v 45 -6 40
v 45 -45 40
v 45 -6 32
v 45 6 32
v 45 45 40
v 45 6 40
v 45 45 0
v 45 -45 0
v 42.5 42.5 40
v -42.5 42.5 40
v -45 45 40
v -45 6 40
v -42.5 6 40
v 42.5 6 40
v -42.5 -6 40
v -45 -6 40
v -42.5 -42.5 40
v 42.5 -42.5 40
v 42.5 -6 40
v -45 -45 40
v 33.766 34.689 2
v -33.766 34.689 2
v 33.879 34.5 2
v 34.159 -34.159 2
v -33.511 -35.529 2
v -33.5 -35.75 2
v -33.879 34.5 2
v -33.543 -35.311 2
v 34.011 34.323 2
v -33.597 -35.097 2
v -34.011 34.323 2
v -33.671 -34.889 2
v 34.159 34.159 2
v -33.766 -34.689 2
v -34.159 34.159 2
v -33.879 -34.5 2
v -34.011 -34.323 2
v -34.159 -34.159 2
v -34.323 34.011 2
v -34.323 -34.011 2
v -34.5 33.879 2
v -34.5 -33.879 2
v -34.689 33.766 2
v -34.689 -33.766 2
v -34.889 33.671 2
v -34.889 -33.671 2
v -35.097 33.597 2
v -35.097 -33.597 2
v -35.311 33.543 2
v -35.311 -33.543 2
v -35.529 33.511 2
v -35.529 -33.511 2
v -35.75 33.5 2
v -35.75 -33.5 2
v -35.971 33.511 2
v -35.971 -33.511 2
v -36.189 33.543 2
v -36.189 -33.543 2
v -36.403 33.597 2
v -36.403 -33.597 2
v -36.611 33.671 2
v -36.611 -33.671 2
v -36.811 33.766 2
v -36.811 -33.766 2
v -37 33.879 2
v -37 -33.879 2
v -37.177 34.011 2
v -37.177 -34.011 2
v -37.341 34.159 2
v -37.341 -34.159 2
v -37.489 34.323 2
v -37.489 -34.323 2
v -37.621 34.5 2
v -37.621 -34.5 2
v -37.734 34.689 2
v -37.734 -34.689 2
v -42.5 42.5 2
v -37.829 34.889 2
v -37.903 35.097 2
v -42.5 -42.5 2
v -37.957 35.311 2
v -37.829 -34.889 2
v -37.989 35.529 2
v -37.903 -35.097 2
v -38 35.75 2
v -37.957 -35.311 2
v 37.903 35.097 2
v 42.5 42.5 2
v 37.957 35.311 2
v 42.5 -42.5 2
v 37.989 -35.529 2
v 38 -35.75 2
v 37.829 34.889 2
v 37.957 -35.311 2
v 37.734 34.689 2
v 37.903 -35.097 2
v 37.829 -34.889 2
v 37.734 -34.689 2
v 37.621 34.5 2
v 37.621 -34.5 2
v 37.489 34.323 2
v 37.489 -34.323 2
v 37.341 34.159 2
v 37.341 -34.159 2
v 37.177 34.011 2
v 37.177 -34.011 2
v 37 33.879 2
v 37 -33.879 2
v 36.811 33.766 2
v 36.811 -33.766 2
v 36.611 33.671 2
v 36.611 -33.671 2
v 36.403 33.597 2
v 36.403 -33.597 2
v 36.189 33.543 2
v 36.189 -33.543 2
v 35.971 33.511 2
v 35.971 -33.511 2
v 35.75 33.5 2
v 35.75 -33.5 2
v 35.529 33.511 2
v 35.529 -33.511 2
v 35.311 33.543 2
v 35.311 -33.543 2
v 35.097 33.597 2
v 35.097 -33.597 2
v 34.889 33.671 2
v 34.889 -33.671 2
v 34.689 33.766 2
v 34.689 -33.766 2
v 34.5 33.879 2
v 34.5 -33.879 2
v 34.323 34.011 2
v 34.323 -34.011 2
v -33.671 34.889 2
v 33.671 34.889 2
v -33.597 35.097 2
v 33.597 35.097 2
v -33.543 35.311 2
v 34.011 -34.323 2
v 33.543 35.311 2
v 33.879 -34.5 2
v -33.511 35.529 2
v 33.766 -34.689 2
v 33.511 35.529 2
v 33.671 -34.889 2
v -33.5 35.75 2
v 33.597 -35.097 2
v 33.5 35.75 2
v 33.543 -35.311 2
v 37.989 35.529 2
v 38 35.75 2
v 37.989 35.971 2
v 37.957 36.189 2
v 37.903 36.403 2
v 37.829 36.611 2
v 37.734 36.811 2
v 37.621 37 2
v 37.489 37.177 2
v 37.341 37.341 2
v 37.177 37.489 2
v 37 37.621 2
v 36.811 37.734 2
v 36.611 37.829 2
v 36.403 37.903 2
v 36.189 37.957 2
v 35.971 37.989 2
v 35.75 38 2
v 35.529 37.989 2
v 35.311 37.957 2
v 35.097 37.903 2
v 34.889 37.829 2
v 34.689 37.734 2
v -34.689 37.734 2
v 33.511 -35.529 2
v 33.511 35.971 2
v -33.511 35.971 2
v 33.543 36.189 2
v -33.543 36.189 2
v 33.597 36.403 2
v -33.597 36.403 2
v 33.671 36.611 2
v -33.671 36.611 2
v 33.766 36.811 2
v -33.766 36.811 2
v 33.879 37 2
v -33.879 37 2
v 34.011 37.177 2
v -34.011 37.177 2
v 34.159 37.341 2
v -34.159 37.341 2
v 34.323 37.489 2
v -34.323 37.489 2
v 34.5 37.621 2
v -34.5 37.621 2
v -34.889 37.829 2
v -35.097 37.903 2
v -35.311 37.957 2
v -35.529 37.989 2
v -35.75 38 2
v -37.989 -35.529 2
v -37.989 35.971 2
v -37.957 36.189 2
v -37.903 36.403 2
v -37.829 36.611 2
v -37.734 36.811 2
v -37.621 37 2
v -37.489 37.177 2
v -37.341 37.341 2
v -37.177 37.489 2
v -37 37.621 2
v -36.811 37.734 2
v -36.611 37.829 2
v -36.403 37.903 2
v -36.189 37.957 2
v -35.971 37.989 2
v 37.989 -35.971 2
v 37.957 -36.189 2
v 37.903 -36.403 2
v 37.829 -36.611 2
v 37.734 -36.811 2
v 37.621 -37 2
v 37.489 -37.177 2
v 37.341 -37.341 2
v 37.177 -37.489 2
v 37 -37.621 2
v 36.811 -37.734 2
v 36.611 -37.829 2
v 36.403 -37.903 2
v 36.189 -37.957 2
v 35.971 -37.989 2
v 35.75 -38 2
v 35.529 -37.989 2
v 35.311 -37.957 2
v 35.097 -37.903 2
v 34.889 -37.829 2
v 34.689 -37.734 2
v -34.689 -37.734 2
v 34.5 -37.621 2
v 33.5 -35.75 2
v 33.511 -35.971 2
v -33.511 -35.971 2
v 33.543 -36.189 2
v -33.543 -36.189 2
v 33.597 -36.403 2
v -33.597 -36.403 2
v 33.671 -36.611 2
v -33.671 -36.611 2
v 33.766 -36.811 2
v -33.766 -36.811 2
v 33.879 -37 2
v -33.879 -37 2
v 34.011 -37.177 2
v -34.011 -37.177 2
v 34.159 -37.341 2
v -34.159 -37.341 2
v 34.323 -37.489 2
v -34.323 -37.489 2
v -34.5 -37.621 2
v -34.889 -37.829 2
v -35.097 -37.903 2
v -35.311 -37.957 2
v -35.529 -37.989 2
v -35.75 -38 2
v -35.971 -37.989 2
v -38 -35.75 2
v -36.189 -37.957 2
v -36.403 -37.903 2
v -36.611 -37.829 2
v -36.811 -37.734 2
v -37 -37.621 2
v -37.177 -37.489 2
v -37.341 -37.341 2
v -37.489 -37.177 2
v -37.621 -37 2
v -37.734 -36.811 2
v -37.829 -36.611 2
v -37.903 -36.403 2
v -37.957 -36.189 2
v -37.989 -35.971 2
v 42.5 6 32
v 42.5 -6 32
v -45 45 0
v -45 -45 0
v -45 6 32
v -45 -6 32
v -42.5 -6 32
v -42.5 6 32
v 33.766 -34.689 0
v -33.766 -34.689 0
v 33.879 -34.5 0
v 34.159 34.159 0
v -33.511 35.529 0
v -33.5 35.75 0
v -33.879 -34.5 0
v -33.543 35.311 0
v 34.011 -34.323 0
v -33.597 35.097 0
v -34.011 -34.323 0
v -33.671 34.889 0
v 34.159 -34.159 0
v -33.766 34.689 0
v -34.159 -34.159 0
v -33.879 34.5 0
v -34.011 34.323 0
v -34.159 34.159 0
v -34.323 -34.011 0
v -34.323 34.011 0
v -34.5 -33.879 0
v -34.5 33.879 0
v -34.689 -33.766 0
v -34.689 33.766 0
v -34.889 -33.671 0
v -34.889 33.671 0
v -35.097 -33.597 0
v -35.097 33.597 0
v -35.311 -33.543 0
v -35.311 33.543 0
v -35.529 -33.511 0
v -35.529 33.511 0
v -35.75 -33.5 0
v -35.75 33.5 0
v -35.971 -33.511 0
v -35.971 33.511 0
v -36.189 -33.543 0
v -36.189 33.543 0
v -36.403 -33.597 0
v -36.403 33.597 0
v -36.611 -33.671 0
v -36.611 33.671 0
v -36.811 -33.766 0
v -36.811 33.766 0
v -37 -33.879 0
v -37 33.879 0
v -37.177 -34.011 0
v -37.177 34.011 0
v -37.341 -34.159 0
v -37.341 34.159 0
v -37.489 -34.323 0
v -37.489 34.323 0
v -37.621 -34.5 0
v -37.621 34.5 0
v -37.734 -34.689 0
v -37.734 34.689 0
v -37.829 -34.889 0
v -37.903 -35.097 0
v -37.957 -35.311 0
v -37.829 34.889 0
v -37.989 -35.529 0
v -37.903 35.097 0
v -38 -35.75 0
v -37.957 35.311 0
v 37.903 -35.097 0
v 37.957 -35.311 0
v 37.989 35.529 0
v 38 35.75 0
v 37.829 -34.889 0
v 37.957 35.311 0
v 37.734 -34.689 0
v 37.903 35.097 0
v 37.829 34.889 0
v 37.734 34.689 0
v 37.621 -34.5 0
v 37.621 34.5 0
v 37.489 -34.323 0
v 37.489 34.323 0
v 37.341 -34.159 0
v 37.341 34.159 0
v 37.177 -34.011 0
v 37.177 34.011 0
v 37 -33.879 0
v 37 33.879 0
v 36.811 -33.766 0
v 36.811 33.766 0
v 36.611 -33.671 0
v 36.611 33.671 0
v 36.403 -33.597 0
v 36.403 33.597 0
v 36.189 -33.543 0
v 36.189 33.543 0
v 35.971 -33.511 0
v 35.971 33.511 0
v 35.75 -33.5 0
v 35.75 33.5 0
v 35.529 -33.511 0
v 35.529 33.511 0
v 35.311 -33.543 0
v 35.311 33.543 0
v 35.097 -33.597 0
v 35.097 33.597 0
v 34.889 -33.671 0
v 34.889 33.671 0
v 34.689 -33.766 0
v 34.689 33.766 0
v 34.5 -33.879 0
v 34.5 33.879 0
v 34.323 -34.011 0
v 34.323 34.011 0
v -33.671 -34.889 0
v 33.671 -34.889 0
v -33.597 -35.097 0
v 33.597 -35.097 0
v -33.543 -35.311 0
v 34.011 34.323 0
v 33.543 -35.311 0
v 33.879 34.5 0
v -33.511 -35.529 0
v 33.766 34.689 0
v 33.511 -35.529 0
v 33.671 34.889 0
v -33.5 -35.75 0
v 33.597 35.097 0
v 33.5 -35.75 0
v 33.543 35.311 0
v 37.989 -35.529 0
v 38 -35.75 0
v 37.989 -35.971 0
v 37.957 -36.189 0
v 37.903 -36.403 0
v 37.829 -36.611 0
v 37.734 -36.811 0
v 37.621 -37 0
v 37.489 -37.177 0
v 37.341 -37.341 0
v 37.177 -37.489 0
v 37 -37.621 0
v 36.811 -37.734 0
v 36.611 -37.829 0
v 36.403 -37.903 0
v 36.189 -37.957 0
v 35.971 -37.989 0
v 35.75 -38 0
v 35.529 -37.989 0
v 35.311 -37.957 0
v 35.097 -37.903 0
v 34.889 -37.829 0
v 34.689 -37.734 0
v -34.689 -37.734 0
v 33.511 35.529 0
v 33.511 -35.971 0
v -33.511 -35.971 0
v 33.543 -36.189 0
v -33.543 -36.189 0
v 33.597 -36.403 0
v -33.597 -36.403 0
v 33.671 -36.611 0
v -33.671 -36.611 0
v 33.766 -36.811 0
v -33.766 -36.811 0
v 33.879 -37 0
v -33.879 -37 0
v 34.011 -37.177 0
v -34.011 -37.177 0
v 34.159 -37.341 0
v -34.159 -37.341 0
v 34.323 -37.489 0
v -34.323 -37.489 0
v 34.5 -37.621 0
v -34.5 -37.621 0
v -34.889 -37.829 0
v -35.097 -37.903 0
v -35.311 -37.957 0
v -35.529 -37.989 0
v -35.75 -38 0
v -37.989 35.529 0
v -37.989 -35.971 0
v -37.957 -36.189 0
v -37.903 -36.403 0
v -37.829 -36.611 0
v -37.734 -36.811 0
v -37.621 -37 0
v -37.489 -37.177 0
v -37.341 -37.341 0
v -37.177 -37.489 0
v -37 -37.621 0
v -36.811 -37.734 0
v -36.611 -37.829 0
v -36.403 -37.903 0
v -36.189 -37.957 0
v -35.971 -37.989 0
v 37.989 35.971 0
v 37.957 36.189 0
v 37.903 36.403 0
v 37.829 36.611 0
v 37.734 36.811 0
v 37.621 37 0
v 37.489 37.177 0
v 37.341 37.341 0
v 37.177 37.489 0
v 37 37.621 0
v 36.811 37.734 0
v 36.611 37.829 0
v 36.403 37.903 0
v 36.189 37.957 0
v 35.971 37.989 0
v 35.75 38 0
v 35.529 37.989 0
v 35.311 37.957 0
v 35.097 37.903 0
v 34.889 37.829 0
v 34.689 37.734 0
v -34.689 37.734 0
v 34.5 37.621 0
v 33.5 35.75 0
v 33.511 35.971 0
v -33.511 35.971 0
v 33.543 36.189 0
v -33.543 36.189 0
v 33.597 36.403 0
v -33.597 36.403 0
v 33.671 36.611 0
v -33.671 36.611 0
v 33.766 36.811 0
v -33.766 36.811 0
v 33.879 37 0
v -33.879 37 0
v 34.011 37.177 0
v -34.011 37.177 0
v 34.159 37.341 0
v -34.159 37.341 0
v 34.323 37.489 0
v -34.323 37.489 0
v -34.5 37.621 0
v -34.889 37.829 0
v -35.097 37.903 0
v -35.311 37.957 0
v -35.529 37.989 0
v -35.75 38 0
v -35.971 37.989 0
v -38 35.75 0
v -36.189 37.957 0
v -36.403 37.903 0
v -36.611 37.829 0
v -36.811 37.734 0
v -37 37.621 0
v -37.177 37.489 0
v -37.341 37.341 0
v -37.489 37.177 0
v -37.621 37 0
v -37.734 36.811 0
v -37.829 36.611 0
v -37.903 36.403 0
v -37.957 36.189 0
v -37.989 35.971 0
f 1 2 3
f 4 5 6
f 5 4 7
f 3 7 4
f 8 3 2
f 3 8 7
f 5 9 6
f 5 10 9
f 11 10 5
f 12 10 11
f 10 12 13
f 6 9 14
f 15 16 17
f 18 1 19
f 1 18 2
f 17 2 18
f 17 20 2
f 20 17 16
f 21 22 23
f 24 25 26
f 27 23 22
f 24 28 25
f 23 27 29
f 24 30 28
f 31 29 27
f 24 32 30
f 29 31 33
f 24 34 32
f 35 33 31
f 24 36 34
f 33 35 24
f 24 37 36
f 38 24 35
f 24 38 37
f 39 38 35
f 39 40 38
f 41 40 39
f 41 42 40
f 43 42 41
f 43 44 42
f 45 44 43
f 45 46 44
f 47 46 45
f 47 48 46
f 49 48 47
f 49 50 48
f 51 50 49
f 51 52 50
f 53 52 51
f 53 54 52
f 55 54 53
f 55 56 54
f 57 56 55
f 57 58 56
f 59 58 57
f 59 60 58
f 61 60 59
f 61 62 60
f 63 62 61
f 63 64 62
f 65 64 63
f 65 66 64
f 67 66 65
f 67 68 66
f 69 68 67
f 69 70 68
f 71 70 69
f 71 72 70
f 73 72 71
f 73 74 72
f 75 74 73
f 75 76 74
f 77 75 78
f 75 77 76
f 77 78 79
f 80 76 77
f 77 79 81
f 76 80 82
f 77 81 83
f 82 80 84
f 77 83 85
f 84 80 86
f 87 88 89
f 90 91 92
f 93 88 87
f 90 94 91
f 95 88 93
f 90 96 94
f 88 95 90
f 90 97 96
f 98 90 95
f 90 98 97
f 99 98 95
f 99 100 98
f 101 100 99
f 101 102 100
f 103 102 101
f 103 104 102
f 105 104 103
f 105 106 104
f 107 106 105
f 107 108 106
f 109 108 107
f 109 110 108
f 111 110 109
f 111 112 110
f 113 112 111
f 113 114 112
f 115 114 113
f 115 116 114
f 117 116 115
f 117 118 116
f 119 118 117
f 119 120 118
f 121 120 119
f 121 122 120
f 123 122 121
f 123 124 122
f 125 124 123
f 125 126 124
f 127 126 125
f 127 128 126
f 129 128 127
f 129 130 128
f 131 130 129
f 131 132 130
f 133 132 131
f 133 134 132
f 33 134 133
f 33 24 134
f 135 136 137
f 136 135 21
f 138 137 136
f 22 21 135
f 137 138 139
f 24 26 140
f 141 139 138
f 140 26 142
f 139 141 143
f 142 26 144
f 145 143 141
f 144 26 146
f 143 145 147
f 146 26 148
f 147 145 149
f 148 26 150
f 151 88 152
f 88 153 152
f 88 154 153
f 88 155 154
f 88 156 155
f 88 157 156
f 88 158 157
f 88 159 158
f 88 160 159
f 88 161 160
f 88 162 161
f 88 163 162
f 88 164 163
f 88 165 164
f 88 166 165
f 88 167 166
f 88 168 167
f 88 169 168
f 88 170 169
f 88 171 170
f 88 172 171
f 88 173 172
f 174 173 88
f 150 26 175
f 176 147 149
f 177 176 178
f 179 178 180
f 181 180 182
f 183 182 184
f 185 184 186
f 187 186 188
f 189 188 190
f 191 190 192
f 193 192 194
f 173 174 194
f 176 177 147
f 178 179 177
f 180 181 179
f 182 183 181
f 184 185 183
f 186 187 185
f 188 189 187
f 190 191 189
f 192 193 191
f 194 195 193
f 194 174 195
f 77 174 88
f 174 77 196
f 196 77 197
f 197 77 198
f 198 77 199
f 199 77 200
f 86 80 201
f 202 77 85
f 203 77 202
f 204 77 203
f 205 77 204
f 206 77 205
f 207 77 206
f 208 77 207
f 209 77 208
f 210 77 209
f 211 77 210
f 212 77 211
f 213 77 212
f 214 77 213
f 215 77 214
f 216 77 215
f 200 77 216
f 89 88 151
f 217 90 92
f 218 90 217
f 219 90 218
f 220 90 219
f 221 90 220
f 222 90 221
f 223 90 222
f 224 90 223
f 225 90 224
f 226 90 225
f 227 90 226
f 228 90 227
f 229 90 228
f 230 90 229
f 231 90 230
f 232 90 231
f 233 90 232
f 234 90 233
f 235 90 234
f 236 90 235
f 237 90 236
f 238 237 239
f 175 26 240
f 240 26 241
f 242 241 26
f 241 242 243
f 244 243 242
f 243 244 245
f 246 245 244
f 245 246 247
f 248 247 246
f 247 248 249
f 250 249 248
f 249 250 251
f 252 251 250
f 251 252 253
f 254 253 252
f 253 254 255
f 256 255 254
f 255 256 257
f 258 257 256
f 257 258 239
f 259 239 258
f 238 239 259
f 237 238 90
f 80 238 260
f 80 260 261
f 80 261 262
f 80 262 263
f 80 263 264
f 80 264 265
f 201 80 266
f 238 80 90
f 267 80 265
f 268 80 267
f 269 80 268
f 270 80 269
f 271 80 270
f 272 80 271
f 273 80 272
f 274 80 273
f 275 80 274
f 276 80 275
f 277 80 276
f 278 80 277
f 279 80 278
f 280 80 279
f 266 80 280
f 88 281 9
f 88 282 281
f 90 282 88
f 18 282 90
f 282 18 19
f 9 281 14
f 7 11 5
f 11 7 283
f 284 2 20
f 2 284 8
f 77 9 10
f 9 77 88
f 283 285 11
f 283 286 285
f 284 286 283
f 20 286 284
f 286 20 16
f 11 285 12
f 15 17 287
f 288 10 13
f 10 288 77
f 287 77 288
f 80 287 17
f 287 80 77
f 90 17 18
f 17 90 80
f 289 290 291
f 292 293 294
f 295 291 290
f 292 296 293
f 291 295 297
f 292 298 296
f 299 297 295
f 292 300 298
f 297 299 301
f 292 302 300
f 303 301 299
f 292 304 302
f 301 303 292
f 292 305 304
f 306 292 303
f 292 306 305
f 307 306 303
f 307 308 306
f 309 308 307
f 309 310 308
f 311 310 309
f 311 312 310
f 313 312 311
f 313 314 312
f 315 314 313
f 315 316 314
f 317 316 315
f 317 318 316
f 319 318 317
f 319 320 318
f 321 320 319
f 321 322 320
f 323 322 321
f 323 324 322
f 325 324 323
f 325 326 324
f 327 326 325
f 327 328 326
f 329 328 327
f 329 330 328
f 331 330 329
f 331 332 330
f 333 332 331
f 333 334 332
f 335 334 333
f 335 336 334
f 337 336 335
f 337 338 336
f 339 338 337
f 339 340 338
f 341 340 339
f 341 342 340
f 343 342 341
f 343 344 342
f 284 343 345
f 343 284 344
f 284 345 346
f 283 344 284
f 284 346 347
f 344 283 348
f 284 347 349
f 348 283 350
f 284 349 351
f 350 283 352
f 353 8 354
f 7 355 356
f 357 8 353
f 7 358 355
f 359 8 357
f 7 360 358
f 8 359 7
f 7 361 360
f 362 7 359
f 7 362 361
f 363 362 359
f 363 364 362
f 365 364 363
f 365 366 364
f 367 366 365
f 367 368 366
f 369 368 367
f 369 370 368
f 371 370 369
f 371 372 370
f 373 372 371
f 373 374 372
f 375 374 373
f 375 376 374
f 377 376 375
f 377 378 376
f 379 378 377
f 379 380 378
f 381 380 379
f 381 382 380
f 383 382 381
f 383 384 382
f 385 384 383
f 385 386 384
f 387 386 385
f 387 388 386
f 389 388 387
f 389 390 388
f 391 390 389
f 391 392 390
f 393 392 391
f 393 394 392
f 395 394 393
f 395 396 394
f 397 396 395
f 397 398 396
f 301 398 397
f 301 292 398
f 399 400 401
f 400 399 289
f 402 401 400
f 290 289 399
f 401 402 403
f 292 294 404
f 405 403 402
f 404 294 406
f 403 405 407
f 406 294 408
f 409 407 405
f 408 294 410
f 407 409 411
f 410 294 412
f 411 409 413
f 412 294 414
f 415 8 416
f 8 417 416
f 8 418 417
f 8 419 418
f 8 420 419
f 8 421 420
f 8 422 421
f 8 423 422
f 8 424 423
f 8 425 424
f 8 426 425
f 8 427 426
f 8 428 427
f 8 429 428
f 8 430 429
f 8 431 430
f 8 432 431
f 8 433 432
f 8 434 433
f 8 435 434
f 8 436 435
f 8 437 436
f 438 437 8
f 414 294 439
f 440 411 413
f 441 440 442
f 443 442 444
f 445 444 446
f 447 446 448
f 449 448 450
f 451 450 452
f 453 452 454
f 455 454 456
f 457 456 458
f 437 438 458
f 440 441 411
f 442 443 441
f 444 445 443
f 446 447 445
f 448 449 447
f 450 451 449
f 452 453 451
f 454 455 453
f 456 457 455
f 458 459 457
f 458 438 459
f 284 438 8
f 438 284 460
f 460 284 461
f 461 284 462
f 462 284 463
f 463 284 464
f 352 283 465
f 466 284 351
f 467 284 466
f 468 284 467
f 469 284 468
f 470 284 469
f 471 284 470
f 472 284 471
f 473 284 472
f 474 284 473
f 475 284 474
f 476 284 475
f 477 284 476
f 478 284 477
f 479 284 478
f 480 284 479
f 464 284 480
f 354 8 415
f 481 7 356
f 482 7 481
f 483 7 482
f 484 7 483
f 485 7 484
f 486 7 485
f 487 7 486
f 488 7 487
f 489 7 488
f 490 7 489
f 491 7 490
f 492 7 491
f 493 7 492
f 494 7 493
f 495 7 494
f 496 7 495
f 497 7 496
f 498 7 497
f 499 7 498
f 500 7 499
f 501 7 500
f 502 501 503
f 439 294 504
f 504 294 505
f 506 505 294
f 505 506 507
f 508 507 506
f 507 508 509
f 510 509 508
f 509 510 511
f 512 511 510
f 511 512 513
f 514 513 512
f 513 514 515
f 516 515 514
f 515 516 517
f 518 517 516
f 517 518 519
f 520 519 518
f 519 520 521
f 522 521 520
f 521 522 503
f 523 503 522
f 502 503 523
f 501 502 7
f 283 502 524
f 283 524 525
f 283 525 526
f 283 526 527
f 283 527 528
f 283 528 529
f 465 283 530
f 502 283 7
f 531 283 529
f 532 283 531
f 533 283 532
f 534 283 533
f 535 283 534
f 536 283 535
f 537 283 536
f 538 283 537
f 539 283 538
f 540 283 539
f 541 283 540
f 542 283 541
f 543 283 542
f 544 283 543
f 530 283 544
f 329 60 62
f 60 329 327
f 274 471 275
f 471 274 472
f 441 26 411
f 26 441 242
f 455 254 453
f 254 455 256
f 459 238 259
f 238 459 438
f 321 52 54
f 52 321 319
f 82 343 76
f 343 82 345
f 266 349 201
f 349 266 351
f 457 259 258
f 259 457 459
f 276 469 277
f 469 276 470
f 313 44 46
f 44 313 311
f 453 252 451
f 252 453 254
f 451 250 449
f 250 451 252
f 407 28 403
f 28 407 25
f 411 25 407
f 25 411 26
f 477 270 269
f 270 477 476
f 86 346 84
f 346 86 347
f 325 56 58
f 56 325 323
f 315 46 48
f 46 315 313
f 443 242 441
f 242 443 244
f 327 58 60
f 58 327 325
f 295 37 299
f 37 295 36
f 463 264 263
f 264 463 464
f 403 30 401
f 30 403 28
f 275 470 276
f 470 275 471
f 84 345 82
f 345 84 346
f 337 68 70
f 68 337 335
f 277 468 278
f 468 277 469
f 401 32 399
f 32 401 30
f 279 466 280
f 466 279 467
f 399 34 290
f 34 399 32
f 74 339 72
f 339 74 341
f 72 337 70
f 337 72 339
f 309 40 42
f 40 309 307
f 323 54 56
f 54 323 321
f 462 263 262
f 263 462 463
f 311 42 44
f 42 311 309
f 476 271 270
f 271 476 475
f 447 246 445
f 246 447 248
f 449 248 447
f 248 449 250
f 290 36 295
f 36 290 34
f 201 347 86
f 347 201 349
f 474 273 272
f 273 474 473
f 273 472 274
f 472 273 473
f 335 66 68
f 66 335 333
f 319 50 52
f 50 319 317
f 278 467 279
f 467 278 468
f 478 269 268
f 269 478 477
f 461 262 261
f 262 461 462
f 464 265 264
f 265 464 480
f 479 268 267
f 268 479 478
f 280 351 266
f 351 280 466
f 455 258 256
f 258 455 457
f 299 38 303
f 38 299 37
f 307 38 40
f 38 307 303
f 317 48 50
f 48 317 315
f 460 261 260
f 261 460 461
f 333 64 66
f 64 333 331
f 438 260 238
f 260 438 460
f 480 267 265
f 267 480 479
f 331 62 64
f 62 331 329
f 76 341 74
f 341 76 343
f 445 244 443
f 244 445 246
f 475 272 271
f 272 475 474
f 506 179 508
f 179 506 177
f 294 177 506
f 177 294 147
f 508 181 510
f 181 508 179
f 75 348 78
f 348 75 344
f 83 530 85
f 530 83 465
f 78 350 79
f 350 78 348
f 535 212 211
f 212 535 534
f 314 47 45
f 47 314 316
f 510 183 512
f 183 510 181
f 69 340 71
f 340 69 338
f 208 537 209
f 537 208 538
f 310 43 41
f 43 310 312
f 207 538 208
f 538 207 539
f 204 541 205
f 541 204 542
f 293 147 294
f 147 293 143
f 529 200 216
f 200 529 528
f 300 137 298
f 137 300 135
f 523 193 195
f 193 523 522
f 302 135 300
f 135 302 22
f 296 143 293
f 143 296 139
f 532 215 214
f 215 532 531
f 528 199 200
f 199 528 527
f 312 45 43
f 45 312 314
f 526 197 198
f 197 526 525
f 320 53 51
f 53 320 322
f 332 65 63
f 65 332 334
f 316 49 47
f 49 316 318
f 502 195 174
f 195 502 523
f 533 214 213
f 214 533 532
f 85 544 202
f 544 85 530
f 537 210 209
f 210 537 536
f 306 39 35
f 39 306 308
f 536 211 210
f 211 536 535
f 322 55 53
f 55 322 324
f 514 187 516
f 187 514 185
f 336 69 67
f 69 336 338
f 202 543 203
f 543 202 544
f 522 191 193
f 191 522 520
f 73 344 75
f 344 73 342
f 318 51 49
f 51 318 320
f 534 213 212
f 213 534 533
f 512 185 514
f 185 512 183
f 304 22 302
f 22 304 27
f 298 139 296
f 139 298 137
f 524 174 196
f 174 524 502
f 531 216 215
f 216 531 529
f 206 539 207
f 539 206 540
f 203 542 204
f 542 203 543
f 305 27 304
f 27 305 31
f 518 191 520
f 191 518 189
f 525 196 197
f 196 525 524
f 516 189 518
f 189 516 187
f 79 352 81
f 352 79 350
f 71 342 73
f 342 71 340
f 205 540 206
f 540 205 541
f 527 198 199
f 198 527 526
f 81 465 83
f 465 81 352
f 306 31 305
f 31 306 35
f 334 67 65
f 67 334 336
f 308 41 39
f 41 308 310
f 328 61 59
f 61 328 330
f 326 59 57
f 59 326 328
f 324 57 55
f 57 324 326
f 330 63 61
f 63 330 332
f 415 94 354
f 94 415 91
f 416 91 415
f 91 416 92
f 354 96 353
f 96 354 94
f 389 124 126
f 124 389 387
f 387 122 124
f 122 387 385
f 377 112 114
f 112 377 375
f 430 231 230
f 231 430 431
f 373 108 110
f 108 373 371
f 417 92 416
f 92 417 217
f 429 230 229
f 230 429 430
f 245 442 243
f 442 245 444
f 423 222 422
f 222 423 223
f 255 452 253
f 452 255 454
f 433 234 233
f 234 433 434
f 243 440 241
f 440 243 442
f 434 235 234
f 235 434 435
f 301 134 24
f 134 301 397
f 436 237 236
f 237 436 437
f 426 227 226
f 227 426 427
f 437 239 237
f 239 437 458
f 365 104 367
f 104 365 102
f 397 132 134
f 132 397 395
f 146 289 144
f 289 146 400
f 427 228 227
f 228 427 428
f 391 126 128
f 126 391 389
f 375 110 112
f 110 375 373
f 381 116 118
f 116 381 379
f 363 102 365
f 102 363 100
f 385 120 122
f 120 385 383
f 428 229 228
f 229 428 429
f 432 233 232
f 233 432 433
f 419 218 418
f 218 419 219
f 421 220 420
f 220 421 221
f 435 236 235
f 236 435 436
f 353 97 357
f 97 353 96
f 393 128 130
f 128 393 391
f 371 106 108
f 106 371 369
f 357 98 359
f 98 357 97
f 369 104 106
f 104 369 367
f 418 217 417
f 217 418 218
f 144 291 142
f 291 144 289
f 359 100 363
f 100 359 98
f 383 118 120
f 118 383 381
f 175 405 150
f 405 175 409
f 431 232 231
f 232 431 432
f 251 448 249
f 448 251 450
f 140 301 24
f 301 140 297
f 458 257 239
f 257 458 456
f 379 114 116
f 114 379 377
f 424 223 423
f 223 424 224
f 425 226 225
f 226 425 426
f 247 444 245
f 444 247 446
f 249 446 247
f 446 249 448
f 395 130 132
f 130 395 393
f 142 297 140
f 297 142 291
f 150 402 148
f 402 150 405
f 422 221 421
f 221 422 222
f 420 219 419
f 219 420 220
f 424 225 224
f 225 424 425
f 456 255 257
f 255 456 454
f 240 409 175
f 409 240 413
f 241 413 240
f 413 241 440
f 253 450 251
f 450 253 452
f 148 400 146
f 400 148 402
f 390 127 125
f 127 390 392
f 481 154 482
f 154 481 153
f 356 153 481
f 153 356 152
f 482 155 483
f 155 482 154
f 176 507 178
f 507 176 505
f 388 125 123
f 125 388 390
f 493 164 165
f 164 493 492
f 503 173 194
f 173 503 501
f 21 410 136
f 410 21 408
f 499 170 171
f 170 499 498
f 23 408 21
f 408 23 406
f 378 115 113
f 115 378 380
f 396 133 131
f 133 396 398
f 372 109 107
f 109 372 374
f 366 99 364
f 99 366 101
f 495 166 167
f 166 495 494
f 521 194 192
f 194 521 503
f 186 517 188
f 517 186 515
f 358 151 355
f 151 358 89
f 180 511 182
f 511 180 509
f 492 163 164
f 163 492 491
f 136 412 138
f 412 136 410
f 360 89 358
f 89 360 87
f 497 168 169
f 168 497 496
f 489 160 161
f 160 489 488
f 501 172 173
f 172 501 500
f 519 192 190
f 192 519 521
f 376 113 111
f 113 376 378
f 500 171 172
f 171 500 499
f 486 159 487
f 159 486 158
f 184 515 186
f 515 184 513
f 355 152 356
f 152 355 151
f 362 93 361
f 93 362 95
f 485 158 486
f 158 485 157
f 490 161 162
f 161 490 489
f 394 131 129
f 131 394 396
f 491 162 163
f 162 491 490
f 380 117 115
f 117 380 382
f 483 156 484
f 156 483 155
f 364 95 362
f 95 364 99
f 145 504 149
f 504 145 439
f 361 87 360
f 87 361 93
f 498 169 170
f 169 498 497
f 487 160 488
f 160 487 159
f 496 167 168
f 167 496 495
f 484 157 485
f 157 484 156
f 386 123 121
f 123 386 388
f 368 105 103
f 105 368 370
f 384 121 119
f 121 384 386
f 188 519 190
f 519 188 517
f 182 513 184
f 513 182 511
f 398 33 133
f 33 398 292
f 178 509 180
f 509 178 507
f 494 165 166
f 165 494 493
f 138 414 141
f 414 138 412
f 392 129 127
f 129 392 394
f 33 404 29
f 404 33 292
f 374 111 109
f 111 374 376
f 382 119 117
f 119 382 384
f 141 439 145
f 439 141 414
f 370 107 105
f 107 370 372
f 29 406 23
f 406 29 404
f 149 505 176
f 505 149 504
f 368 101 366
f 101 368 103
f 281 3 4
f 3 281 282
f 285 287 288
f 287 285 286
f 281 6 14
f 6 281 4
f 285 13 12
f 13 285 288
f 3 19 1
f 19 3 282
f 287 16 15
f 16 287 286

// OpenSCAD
// Magnetic stirrer housing for 80 mm PC case fan
// Print orientation: top plate on bed (z = 0), walls rise to open top (z = 40)

// ---------- Parameters ----------
plate_t      = 2;     // top plate thickness
wall_t       = 2.5;   // wall thickness
open_top_z   = 40;    // height of open top
outer_size   = 90;    // outer X and Y size of box
screw_hole   = 4.5;   // M4 screw hole diameter
screw_pitch  = 71.5;  // square pattern size for screw holes
cable_notch  = 12;    // cable notch width
cable_depth  = 8;     // cable notch depth from open edge
eps          = 0.5;   // cutter overshoot past faces

$fn = 64;

// ---------- Model ----------
difference() {
    // Main box body
    union() {
        // Top plate
        translate([-outer_size/2, -outer_size/2, 0])
            cube([outer_size, outer_size, plate_t]);
        // Walls
        for (a = [0, 90, 180, 270])
            rotate([0, 0, a])
                translate([outer_size/2 - wall_t, -outer_size/2, plate_t])
                    cube([wall_t, outer_size, open_top_z - plate_t]);
    }

    // Screw holes through top plate
    for (x = [-screw_pitch/2, screw_pitch/2])
        for (y = [-screw_pitch/2, screw_pitch/2])
            translate([x, y, -eps])
                cylinder(d = screw_hole, h = plate_t + 2*eps);

    // Cable notch in one wall (centred along Y, from z = 32 to z = 40)
    translate([-outer_size/2, -cable_notch/2, open_top_z - cable_depth])
        cube([outer_size, cable_notch, cable_depth + eps]);
}
